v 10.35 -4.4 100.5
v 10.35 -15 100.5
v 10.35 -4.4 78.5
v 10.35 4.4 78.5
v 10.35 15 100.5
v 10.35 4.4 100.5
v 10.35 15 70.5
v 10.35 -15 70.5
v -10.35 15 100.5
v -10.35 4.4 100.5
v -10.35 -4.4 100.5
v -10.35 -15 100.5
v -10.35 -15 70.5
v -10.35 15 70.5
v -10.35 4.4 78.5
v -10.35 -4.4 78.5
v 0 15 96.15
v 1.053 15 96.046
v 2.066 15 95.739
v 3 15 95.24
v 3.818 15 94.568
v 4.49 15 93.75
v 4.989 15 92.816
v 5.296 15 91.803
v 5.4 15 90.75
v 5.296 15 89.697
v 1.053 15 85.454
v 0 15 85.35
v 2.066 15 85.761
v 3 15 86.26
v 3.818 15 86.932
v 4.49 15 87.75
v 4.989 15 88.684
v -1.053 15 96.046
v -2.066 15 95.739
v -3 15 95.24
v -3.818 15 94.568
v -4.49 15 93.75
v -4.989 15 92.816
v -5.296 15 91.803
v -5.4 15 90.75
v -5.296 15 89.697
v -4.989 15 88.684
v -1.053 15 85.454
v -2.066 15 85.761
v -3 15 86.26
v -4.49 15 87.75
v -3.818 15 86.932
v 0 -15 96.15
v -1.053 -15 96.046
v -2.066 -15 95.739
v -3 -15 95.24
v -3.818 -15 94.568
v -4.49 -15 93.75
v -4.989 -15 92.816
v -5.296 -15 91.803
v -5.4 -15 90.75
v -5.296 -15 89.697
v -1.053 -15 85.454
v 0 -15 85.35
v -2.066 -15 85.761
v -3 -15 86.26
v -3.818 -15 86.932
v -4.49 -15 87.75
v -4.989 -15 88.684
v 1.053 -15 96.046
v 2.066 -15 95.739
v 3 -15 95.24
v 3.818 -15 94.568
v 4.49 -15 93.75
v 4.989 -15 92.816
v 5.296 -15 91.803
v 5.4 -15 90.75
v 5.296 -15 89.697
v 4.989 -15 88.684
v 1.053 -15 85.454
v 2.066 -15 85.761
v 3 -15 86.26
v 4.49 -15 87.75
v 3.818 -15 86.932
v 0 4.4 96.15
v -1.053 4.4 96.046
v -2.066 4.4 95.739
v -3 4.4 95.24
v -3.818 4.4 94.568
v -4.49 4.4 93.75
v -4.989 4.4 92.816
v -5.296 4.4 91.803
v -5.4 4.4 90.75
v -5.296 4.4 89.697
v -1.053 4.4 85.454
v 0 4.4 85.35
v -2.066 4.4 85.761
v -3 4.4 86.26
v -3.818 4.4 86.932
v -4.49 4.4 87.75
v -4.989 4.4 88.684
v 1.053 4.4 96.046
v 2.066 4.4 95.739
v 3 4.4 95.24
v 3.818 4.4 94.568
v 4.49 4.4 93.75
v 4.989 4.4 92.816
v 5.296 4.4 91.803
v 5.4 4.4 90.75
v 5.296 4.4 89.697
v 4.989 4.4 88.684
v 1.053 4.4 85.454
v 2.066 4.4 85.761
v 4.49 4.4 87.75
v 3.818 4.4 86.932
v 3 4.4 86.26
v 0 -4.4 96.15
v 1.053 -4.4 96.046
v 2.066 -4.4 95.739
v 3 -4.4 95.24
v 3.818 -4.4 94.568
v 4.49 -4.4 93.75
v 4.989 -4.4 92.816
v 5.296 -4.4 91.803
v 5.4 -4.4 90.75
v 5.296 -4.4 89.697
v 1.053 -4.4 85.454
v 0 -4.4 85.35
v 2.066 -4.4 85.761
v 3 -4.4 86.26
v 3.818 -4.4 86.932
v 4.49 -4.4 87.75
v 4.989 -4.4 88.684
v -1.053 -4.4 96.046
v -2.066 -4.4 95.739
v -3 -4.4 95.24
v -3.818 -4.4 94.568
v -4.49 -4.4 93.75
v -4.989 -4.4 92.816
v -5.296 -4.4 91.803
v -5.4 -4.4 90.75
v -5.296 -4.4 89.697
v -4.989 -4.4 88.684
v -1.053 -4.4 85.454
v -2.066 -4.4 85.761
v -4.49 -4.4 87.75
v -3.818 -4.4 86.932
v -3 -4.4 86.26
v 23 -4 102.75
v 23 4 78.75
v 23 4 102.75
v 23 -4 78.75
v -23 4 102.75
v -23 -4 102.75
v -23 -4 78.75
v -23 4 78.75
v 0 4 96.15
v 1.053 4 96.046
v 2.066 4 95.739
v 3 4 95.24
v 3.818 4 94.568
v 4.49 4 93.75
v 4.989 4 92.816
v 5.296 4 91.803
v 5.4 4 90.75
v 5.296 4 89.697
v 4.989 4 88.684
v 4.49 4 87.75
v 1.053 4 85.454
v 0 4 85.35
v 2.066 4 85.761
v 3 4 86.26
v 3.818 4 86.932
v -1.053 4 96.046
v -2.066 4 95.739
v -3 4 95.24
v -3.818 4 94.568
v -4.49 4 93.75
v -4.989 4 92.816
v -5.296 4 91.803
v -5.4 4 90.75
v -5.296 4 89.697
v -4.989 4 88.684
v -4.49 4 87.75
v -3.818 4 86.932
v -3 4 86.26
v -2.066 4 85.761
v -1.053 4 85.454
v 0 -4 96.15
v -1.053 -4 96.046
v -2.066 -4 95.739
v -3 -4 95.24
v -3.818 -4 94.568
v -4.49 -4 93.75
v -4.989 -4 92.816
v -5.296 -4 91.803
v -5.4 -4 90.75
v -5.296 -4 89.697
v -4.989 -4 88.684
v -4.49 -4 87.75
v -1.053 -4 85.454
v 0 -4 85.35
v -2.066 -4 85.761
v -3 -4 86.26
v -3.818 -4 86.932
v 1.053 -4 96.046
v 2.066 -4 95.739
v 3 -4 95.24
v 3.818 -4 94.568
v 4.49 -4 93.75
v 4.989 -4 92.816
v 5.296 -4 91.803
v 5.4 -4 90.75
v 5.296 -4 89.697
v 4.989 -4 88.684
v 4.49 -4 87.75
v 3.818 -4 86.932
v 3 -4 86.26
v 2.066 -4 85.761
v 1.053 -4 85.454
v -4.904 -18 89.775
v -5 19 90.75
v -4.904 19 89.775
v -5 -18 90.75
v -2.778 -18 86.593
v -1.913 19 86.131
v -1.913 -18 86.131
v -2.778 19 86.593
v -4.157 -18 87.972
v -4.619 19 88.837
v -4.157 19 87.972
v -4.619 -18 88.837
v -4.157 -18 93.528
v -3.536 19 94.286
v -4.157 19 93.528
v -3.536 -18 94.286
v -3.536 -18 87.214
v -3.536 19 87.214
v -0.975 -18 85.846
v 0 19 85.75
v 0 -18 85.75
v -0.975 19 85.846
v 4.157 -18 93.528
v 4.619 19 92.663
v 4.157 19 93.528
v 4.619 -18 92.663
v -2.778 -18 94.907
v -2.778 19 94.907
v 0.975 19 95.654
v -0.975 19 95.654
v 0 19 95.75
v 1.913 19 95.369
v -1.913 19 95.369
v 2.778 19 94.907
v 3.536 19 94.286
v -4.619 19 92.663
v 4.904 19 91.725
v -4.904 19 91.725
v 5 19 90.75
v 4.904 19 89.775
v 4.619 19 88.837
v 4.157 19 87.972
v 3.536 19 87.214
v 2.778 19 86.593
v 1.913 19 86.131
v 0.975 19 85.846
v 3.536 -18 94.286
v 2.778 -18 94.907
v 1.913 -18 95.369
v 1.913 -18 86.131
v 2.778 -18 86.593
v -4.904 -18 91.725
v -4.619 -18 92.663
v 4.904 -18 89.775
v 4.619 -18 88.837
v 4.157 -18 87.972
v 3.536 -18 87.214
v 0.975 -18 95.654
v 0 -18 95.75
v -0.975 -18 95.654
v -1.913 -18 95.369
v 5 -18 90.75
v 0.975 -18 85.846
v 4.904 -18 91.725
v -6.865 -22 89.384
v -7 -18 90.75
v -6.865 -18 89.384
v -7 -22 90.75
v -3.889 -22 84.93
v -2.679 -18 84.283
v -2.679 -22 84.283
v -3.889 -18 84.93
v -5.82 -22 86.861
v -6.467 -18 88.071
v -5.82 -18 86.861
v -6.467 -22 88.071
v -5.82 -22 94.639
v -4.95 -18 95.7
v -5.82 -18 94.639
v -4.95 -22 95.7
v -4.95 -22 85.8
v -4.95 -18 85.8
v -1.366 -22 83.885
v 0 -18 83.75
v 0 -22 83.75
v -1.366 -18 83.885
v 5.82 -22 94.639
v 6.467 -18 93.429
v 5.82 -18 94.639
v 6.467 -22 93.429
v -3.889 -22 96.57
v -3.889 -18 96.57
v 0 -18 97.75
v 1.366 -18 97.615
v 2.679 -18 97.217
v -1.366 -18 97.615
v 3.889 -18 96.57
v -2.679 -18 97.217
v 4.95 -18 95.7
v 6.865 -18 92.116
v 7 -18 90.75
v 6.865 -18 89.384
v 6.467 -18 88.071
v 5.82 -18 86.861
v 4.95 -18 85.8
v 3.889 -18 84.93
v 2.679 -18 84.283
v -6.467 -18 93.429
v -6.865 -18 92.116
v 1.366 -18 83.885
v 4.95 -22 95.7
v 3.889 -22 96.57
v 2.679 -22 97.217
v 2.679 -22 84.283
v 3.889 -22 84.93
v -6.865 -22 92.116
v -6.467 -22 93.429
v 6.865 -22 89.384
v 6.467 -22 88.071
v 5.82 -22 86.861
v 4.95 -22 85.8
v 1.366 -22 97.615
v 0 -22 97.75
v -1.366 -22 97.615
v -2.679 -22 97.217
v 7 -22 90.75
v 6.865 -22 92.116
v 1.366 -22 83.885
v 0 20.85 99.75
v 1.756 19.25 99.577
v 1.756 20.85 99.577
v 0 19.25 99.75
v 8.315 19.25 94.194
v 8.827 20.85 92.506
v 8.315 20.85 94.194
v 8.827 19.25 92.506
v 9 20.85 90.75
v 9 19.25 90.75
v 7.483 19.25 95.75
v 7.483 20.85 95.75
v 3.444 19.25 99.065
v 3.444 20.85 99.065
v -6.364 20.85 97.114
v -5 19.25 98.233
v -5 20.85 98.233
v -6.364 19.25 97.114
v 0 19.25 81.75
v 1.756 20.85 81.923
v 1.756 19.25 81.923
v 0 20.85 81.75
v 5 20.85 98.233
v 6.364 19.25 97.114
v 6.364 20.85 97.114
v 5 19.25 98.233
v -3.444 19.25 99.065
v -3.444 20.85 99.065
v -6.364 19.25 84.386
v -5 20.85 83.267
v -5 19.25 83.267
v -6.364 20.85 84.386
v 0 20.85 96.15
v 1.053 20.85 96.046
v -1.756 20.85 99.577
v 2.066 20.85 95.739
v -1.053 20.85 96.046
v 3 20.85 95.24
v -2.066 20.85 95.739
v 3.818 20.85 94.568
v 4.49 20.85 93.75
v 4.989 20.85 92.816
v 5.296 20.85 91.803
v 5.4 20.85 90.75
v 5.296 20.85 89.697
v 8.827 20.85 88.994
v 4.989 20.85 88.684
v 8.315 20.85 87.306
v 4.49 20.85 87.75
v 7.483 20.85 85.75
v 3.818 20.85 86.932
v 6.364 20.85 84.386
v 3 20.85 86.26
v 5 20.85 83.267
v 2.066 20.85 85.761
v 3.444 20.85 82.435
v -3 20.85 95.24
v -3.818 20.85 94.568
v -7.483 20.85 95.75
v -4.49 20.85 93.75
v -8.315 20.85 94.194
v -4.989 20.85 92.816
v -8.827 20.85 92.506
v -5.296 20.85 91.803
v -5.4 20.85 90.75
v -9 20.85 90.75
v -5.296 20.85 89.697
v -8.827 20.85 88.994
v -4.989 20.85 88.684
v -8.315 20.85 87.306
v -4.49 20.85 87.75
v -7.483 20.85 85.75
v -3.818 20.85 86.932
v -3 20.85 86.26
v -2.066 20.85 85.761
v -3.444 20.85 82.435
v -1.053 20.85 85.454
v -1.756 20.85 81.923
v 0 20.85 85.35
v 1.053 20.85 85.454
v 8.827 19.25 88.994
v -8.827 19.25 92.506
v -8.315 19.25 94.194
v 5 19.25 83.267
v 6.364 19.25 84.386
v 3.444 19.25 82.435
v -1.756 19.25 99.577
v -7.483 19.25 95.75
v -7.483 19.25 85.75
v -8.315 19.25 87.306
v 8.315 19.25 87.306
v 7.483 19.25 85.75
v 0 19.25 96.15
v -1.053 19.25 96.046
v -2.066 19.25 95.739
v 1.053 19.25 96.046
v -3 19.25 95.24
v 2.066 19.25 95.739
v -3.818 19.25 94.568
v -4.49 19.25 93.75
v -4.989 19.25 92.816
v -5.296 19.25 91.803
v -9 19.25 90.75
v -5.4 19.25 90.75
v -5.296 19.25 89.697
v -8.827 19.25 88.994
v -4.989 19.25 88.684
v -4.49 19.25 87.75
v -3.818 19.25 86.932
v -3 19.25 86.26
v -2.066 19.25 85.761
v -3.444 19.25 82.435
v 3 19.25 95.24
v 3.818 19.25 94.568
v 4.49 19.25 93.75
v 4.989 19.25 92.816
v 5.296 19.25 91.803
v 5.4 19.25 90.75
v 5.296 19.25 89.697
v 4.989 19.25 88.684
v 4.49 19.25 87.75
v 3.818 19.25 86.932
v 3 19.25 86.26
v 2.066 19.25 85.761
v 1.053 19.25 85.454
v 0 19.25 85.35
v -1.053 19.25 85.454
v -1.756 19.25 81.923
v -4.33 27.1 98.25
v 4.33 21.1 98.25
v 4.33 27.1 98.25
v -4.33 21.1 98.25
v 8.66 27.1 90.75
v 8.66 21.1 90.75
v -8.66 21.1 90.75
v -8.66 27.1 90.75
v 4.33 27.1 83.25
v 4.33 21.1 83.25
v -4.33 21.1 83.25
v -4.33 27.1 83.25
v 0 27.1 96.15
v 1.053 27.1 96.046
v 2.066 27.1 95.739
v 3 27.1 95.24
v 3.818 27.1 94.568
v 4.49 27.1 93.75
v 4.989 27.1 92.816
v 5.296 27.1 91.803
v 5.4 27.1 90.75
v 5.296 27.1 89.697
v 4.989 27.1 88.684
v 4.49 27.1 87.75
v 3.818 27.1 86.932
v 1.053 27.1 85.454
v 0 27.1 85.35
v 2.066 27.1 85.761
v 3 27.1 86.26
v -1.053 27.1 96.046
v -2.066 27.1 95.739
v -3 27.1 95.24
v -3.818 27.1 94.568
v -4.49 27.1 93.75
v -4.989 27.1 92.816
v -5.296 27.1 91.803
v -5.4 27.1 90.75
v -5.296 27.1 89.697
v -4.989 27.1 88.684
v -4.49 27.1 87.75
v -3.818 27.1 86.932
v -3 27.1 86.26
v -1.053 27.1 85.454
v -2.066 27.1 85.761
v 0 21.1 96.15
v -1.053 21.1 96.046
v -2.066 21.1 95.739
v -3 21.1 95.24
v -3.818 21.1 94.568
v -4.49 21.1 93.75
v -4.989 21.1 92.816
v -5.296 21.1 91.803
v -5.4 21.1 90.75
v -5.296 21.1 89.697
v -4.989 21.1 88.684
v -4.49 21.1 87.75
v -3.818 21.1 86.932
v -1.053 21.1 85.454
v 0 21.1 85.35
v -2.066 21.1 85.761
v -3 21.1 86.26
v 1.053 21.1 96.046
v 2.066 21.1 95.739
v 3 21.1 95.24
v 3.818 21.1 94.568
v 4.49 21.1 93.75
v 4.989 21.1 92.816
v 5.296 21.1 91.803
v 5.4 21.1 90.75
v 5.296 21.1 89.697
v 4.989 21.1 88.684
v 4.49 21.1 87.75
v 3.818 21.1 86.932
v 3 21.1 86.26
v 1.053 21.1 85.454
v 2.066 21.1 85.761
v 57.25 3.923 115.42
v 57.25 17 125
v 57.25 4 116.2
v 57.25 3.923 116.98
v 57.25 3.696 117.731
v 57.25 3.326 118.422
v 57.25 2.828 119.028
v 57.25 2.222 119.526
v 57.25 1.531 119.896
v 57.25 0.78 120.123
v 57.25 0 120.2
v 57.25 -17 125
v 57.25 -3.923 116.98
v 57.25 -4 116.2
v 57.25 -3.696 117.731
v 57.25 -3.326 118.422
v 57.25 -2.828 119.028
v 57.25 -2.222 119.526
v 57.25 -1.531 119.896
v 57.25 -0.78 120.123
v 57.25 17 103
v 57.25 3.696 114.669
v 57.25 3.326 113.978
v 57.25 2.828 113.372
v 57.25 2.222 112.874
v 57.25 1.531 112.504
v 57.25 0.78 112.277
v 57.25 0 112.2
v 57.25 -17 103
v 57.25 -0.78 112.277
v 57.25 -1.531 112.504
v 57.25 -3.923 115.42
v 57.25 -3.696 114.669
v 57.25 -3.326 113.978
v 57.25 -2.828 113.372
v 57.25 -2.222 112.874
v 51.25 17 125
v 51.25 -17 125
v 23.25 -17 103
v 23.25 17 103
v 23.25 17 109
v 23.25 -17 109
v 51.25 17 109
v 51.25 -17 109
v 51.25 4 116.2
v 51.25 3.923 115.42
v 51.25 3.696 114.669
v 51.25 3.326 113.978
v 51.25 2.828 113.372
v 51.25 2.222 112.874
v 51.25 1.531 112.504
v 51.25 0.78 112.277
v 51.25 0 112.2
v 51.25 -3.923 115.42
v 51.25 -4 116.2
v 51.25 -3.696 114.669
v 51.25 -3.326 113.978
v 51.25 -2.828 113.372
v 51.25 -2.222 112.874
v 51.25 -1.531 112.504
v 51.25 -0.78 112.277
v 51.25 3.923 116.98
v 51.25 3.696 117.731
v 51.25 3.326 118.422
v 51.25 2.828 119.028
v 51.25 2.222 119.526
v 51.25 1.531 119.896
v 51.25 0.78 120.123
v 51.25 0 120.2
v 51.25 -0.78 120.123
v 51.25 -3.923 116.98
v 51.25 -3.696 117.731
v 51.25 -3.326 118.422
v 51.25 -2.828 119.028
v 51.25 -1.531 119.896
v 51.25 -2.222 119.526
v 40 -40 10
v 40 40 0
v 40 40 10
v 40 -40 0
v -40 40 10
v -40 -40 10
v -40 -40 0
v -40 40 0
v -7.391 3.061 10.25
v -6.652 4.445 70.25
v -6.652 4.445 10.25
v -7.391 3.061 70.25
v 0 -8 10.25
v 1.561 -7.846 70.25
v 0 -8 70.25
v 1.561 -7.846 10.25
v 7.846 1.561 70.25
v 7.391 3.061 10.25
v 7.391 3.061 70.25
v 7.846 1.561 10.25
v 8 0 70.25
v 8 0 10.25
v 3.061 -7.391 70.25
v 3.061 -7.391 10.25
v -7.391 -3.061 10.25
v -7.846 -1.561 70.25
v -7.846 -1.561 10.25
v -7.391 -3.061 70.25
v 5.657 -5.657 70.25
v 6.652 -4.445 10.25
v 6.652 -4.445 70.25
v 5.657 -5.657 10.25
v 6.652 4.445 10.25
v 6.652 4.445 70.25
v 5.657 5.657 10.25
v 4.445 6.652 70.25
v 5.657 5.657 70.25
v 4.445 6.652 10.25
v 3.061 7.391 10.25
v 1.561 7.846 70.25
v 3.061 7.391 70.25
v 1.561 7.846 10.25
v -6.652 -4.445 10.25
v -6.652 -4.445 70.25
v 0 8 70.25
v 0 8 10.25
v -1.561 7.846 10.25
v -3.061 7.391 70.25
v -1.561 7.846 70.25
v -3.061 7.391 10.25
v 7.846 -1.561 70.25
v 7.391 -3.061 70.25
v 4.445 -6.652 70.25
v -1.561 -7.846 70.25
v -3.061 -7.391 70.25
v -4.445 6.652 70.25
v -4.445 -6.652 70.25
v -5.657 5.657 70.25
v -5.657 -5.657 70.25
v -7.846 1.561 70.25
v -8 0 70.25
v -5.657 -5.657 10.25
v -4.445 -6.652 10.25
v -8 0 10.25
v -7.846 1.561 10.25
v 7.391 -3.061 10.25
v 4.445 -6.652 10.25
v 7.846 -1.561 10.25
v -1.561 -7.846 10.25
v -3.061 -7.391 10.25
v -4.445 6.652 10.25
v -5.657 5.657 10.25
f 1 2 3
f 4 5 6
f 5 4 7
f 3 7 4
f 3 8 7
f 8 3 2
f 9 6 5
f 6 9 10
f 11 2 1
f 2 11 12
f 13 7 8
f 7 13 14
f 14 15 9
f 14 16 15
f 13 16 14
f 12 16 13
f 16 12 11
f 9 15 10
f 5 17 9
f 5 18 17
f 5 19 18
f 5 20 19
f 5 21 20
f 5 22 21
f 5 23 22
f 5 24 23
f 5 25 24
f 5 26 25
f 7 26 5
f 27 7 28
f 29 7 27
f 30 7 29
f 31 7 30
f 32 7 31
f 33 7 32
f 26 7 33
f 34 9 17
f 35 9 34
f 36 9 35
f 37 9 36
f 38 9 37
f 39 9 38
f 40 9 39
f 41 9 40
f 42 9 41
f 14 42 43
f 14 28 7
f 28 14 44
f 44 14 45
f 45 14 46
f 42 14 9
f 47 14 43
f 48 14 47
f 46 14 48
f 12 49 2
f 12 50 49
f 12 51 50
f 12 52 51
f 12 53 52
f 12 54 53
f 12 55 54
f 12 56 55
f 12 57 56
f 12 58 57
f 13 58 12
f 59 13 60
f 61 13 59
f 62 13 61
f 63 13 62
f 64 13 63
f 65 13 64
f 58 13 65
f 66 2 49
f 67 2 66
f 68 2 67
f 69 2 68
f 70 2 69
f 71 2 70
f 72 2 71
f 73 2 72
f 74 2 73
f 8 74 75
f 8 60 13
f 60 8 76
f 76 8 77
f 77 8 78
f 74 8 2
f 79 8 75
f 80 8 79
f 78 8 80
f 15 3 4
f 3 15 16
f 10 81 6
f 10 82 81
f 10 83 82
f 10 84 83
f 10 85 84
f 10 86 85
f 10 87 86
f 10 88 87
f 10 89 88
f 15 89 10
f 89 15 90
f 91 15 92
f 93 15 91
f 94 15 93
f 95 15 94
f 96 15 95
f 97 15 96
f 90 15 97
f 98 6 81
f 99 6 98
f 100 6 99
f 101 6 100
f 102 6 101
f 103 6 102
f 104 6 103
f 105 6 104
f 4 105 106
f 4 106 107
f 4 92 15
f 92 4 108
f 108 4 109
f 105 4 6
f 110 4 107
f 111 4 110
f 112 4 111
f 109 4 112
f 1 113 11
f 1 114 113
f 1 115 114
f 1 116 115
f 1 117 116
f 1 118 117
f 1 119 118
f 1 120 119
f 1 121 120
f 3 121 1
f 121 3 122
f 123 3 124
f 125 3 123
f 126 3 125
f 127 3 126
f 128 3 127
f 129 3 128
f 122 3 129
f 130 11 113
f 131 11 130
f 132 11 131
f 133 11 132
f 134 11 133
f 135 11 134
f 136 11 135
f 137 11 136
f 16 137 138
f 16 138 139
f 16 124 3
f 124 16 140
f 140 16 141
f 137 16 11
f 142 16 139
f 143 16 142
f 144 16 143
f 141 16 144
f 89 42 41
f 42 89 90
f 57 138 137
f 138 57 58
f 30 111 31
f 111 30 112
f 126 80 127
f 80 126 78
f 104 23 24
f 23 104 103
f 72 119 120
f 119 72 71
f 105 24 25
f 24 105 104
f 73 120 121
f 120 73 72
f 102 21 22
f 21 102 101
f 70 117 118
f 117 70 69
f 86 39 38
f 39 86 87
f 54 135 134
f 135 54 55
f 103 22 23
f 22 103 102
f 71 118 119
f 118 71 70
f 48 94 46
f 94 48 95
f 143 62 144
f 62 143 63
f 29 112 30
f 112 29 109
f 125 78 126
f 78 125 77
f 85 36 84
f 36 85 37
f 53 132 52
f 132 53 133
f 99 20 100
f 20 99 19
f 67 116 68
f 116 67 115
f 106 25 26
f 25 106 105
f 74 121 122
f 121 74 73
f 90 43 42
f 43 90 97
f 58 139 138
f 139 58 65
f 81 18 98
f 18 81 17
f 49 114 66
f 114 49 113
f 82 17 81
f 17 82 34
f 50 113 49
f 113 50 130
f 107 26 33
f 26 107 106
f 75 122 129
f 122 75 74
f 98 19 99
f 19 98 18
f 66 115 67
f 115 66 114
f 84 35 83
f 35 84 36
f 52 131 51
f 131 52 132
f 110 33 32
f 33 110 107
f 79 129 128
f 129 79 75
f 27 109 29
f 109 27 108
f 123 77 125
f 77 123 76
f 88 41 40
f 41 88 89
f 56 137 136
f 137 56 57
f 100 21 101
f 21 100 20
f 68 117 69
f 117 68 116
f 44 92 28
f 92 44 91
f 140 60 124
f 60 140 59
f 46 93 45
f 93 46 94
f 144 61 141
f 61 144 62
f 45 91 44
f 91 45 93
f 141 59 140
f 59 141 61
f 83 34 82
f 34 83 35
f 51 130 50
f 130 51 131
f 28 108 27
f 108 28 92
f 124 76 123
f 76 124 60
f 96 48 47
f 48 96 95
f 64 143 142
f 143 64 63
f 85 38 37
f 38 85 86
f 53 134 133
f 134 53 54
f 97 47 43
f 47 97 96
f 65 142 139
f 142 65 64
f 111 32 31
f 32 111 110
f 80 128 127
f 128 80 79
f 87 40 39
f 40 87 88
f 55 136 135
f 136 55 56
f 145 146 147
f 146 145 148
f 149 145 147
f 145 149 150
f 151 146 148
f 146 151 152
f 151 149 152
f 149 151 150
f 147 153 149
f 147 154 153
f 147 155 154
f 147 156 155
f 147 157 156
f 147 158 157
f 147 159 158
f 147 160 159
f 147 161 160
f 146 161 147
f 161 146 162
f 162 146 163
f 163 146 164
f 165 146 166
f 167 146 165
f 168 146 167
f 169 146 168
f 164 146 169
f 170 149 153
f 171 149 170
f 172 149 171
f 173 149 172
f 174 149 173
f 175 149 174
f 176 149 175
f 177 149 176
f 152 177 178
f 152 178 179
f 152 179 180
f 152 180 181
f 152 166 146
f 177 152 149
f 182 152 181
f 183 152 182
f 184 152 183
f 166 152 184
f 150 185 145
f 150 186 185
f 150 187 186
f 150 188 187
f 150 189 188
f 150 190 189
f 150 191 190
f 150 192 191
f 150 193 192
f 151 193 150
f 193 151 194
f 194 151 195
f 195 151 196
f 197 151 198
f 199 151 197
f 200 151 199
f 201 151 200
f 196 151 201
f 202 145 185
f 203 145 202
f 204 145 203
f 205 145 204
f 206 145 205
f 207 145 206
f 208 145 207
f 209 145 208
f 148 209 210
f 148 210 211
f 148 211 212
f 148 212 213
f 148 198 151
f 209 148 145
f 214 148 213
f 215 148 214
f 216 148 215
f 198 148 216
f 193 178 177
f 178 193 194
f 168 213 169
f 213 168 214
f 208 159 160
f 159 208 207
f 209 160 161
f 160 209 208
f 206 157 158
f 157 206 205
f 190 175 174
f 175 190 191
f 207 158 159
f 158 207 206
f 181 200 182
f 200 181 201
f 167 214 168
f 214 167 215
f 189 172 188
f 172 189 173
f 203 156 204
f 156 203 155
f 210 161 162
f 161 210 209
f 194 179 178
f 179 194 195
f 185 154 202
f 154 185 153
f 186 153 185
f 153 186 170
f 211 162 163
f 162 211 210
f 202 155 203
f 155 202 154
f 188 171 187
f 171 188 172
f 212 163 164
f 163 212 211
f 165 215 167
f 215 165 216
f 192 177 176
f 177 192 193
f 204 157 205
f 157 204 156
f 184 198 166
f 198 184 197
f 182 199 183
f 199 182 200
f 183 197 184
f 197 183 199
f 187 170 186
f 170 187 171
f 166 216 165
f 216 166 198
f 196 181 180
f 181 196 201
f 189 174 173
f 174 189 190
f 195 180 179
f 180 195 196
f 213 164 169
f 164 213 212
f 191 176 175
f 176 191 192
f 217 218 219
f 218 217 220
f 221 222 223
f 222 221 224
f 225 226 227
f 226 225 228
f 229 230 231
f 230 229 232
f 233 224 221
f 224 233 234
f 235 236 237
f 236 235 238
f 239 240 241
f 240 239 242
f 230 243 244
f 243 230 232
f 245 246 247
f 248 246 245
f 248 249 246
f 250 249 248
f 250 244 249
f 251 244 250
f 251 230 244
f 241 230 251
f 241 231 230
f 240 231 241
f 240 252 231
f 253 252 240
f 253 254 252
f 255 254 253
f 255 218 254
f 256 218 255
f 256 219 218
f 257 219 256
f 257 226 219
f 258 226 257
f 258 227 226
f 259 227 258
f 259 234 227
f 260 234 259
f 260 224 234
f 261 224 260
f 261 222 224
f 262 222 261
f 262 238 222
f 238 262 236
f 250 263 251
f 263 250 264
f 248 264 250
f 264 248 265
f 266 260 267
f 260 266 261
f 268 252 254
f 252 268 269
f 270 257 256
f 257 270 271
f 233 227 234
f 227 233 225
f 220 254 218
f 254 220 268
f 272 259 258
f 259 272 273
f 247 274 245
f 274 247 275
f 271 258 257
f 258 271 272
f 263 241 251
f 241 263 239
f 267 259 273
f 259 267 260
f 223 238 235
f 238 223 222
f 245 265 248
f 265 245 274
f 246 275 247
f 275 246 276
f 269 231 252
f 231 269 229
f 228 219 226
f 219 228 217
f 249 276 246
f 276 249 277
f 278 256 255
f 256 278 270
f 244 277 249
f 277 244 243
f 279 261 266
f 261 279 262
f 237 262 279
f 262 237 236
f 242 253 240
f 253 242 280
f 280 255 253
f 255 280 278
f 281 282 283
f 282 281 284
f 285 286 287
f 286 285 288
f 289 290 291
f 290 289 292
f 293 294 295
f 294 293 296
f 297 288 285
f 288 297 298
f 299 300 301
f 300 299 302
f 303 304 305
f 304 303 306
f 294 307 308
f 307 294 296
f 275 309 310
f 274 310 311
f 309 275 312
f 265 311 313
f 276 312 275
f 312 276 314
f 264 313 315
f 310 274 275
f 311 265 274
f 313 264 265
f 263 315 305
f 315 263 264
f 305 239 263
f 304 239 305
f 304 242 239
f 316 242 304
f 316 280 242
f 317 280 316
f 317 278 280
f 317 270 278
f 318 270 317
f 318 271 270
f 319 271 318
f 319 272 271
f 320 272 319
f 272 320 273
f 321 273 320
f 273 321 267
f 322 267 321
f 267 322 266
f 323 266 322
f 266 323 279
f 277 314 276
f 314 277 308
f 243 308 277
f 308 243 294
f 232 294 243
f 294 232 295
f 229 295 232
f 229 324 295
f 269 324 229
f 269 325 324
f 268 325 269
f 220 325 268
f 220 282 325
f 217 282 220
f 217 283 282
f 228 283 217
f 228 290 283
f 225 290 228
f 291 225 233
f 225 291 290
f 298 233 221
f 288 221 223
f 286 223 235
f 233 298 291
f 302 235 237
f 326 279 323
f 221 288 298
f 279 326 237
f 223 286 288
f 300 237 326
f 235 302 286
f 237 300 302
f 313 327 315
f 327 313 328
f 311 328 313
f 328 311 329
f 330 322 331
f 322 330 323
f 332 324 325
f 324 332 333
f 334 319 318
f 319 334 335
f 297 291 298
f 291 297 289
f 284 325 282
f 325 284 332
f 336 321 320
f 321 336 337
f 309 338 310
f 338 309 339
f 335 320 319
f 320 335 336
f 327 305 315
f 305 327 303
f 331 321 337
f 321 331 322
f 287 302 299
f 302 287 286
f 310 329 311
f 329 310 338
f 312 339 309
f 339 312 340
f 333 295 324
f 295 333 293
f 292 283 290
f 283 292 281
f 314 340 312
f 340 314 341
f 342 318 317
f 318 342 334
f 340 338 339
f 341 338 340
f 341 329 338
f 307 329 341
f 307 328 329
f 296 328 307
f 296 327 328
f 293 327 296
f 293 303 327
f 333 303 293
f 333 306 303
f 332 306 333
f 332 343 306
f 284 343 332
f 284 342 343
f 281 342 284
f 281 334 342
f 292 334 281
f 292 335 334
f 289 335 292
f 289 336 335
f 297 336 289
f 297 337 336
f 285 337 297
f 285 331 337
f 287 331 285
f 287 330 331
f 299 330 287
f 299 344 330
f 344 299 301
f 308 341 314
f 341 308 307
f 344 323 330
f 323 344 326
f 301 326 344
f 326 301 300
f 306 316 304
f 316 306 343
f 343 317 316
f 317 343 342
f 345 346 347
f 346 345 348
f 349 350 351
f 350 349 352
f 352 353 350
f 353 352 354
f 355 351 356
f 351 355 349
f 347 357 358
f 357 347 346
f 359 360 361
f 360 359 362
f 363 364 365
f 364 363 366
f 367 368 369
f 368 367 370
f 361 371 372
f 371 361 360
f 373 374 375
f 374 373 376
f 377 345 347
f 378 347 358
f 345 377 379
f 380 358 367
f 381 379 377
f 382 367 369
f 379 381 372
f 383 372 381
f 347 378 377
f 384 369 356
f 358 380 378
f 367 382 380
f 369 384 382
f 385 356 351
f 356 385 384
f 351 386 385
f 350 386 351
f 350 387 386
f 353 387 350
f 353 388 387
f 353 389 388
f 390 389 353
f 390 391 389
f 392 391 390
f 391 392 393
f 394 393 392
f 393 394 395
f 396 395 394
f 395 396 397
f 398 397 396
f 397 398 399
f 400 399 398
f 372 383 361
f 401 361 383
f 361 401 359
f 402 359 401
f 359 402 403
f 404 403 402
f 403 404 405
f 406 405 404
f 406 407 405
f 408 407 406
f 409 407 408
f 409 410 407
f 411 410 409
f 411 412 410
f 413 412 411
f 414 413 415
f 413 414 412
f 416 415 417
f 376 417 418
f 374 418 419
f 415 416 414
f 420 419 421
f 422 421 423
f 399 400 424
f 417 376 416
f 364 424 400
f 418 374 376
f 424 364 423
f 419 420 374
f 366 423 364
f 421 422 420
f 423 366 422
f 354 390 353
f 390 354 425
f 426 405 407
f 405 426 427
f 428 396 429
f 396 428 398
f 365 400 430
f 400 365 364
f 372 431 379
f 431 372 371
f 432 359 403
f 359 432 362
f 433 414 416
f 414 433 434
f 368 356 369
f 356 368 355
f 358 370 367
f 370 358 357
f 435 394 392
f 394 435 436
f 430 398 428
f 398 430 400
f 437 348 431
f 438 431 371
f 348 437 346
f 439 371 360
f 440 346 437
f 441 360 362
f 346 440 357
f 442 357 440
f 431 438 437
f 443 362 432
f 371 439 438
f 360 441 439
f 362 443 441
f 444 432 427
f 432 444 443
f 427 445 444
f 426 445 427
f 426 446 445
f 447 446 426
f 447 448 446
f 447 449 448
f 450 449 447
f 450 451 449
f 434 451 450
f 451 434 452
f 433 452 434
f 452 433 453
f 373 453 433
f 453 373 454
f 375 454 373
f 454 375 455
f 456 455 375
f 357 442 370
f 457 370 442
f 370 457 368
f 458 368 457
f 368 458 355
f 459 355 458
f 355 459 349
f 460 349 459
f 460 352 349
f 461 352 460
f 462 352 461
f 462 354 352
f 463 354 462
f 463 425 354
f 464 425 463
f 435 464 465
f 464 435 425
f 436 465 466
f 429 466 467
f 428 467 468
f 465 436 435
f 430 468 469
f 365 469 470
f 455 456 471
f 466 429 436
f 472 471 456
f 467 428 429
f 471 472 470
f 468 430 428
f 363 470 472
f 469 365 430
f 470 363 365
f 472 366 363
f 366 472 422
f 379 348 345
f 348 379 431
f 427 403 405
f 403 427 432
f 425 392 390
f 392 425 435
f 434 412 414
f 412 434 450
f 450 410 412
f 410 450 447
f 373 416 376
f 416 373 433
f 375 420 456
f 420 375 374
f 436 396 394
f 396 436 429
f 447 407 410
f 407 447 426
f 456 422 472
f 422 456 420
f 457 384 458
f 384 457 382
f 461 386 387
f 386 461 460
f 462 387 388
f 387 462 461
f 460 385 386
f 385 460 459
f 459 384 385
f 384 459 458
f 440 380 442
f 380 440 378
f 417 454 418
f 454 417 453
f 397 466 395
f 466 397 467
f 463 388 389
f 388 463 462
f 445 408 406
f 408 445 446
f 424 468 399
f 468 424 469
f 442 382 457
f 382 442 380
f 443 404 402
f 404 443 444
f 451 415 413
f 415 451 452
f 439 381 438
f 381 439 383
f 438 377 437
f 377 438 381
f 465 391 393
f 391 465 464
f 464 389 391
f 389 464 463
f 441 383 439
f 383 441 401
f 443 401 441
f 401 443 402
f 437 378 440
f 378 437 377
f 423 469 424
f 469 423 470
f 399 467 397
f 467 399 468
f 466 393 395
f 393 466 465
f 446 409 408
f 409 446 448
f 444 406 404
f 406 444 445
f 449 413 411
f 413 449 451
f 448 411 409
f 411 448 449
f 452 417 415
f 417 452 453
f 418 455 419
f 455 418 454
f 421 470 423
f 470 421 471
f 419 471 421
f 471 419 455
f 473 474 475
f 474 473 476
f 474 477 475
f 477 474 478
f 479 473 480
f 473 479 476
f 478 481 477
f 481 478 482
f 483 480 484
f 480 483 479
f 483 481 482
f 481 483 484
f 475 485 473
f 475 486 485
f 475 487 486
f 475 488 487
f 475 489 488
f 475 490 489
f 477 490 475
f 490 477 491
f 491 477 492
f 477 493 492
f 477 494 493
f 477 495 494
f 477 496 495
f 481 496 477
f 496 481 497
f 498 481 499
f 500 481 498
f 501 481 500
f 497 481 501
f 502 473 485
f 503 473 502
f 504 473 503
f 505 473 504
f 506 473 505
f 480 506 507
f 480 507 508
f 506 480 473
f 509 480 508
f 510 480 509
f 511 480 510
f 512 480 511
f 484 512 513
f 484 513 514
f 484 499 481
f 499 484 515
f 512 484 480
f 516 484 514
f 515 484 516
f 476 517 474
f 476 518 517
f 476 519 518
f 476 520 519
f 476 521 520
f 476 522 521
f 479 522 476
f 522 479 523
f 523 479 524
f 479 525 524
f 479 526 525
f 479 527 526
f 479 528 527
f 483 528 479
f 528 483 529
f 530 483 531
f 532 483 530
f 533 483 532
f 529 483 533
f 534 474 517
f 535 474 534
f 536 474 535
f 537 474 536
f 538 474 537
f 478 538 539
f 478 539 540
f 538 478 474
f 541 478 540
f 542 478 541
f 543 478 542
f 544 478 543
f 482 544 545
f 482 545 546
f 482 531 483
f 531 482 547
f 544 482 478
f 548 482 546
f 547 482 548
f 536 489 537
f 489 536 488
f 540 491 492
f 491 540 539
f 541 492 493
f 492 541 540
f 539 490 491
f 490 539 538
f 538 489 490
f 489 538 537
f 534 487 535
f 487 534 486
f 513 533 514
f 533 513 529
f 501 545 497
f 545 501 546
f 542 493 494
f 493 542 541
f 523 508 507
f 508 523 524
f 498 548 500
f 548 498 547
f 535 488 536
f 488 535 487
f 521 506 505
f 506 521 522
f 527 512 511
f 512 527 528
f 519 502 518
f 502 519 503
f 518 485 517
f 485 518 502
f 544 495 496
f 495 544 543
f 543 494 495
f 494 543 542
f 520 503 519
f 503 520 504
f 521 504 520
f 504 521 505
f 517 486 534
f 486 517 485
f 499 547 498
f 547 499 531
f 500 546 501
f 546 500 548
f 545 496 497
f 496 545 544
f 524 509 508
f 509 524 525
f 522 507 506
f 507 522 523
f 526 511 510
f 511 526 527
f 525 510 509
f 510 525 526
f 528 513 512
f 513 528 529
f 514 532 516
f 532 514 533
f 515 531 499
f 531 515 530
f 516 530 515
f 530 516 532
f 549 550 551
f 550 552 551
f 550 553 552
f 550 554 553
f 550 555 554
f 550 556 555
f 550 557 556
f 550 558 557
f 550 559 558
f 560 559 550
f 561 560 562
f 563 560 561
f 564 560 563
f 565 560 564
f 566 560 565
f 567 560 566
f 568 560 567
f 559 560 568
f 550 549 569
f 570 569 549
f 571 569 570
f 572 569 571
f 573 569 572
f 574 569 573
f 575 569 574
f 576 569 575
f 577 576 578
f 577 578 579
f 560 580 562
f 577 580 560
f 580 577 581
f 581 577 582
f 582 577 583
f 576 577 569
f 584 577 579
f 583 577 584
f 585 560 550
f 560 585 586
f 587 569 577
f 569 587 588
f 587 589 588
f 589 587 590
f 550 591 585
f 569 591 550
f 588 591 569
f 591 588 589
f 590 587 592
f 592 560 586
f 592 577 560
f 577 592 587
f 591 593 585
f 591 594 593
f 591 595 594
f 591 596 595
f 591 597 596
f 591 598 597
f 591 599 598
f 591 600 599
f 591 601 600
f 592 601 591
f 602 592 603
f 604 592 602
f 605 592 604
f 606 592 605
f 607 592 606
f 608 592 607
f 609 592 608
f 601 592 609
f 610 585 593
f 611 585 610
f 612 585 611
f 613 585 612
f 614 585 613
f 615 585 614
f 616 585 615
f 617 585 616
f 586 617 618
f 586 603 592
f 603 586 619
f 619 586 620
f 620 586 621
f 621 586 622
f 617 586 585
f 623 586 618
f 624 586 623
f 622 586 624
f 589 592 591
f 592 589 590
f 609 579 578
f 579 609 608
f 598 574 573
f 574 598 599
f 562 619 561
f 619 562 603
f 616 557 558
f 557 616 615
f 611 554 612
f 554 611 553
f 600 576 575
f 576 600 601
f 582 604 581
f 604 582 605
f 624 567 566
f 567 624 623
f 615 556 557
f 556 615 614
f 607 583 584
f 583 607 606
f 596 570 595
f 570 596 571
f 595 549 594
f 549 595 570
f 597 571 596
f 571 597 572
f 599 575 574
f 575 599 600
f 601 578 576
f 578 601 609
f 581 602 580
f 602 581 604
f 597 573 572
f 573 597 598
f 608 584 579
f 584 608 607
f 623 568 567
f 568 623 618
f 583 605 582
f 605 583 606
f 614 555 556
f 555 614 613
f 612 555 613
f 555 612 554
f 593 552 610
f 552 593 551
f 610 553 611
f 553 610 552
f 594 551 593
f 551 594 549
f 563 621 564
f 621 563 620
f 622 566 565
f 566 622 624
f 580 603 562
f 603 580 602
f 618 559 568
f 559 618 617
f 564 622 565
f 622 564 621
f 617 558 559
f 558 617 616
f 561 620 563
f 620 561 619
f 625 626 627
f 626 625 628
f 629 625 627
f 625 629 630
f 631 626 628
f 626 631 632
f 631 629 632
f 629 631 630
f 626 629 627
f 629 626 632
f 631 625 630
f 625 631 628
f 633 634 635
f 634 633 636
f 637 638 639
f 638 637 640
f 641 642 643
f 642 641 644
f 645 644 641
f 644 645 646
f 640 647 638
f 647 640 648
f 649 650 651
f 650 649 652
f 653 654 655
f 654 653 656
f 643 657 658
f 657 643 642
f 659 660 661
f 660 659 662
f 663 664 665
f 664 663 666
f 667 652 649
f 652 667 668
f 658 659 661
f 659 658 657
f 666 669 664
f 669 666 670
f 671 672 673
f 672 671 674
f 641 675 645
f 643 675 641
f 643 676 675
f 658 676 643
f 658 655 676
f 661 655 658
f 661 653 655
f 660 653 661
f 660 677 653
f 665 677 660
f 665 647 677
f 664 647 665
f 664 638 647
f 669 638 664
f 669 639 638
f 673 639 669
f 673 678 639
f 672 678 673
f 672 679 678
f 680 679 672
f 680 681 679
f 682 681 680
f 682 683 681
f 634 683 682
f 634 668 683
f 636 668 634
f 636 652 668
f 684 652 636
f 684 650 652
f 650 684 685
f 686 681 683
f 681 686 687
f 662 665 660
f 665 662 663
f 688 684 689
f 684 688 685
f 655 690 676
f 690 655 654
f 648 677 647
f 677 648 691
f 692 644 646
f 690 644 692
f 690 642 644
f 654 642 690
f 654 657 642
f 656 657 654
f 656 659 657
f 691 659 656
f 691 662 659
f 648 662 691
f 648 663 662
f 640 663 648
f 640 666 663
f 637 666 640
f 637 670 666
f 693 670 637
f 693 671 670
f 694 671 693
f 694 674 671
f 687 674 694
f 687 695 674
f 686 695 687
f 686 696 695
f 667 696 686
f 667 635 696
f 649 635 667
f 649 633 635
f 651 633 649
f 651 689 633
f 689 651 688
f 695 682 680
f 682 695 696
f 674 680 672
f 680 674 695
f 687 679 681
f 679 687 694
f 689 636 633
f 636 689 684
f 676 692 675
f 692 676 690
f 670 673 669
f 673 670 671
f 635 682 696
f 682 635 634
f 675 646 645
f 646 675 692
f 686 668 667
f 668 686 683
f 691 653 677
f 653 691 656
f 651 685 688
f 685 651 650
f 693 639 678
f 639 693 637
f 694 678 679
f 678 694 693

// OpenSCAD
$fn = 32;

// ------------------------------------------------------------------------
// Lamp arm: column d16 x 60 mm, arm 46 mm
// Every part is its own module, assembly() places every instance.
// ------------------------------------------------------------------------

// --- part 1 ---
module lamp_base() {
  difference() {
    translate([-40, -40, 0]) cube([80, 80, 10]);
  }
}

// --- part 2 ---
module lamp_column() {
  cylinder(h = 60, d = 16);
}

// --- part 3 ---
module head_fork() {
  difference() {
    translate([-10.35, -15, 0]) cube([20.7, 30, 30]);
    translate([-11.35, -4.4, 8]) cube([22.7, 8.8, 23]);
    translate([0, 0, 20.25]) rotate([90, 0, 0]) cylinder(h = 32, d = 10.8, center = true);
  }
}

// --- part 4 ---
module lamp_arm() {
  difference() {
    translate([-23, -4, 0]) cube([46, 8, 24]);
    translate([0, 0, 12]) rotate([90, 0, 0]) cylinder(h = 10, d = 10.8, center = true);
  }
}

// --- part 5 ---
module arm_pin() {
  rotate([0, 90, 0]) cylinder(h = 38, d = 10, center = true);
  translate([-22, 0, 0]) rotate([0, 90, 0]) cylinder(h = 4, d = 14);
}

// --- part 6 ---
module arm_washer() {
  difference() {
      translate([0, 0, 0]) cylinder(h = 1.6, d = 18);
      translate([0, 0, -1]) cylinder(h = 3.6, d = 10.8);
    }
}

// --- part 7 ---
module arm_nut() {
  difference() {
    linear_extrude(height = 6) polygon(points = [[8.66, 0], [4.33, 7.5], [-4.33, 7.5], [-8.66, 0], [-4.33, -7.5], [4.33, -7.5]]);
    translate([0, 0, -1]) cylinder(h = 8, d = 10.8);
  }
}

// --- part 8 ---
module shade_bracket() {
  difference() {
    translate([-17, -17, 0]) cube([34, 34, 22]);
    translate([-18, -18, 6]) cube([29, 36, 17]);
    translate([14, 0, 13.2]) rotate([0, 90, 0]) cylinder(h = 8, d = 8, center = true);
  }
}

// --- assembly ---
module assembly() {
  color([0.80, 0.24, 0.20]) translate([0, 0, 0]) rotate([0, 0, 0]) lamp_base();
  color([0.20, 0.45, 0.75]) translate([0, 0, 10.25]) rotate([0, 0, 0]) lamp_column();
  color([0.25, 0.62, 0.32]) translate([0, 0, 70.5]) rotate([0, 0, 0]) head_fork();
  color([0.92, 0.70, 0.18]) translate([0, 0, 78.75]) rotate([0, 0, 0]) lamp_arm();
  color([0.58, 0.35, 0.70]) translate([0, 0, 90.75]) rotate([0, 0, 90]) arm_pin();
  color([0.16, 0.66, 0.66]) translate([0, 20.85, 90.75]) rotate([90, 0, 0]) arm_washer();
  color([0.85, 0.48, 0.18]) translate([0, 27.1, 90.75]) rotate([90, 0, 0]) arm_nut();
  color([0.55, 0.60, 0.65]) translate([40.25, 0, 103]) rotate([0, 0, 0]) shade_bracket();
}

assembly();
